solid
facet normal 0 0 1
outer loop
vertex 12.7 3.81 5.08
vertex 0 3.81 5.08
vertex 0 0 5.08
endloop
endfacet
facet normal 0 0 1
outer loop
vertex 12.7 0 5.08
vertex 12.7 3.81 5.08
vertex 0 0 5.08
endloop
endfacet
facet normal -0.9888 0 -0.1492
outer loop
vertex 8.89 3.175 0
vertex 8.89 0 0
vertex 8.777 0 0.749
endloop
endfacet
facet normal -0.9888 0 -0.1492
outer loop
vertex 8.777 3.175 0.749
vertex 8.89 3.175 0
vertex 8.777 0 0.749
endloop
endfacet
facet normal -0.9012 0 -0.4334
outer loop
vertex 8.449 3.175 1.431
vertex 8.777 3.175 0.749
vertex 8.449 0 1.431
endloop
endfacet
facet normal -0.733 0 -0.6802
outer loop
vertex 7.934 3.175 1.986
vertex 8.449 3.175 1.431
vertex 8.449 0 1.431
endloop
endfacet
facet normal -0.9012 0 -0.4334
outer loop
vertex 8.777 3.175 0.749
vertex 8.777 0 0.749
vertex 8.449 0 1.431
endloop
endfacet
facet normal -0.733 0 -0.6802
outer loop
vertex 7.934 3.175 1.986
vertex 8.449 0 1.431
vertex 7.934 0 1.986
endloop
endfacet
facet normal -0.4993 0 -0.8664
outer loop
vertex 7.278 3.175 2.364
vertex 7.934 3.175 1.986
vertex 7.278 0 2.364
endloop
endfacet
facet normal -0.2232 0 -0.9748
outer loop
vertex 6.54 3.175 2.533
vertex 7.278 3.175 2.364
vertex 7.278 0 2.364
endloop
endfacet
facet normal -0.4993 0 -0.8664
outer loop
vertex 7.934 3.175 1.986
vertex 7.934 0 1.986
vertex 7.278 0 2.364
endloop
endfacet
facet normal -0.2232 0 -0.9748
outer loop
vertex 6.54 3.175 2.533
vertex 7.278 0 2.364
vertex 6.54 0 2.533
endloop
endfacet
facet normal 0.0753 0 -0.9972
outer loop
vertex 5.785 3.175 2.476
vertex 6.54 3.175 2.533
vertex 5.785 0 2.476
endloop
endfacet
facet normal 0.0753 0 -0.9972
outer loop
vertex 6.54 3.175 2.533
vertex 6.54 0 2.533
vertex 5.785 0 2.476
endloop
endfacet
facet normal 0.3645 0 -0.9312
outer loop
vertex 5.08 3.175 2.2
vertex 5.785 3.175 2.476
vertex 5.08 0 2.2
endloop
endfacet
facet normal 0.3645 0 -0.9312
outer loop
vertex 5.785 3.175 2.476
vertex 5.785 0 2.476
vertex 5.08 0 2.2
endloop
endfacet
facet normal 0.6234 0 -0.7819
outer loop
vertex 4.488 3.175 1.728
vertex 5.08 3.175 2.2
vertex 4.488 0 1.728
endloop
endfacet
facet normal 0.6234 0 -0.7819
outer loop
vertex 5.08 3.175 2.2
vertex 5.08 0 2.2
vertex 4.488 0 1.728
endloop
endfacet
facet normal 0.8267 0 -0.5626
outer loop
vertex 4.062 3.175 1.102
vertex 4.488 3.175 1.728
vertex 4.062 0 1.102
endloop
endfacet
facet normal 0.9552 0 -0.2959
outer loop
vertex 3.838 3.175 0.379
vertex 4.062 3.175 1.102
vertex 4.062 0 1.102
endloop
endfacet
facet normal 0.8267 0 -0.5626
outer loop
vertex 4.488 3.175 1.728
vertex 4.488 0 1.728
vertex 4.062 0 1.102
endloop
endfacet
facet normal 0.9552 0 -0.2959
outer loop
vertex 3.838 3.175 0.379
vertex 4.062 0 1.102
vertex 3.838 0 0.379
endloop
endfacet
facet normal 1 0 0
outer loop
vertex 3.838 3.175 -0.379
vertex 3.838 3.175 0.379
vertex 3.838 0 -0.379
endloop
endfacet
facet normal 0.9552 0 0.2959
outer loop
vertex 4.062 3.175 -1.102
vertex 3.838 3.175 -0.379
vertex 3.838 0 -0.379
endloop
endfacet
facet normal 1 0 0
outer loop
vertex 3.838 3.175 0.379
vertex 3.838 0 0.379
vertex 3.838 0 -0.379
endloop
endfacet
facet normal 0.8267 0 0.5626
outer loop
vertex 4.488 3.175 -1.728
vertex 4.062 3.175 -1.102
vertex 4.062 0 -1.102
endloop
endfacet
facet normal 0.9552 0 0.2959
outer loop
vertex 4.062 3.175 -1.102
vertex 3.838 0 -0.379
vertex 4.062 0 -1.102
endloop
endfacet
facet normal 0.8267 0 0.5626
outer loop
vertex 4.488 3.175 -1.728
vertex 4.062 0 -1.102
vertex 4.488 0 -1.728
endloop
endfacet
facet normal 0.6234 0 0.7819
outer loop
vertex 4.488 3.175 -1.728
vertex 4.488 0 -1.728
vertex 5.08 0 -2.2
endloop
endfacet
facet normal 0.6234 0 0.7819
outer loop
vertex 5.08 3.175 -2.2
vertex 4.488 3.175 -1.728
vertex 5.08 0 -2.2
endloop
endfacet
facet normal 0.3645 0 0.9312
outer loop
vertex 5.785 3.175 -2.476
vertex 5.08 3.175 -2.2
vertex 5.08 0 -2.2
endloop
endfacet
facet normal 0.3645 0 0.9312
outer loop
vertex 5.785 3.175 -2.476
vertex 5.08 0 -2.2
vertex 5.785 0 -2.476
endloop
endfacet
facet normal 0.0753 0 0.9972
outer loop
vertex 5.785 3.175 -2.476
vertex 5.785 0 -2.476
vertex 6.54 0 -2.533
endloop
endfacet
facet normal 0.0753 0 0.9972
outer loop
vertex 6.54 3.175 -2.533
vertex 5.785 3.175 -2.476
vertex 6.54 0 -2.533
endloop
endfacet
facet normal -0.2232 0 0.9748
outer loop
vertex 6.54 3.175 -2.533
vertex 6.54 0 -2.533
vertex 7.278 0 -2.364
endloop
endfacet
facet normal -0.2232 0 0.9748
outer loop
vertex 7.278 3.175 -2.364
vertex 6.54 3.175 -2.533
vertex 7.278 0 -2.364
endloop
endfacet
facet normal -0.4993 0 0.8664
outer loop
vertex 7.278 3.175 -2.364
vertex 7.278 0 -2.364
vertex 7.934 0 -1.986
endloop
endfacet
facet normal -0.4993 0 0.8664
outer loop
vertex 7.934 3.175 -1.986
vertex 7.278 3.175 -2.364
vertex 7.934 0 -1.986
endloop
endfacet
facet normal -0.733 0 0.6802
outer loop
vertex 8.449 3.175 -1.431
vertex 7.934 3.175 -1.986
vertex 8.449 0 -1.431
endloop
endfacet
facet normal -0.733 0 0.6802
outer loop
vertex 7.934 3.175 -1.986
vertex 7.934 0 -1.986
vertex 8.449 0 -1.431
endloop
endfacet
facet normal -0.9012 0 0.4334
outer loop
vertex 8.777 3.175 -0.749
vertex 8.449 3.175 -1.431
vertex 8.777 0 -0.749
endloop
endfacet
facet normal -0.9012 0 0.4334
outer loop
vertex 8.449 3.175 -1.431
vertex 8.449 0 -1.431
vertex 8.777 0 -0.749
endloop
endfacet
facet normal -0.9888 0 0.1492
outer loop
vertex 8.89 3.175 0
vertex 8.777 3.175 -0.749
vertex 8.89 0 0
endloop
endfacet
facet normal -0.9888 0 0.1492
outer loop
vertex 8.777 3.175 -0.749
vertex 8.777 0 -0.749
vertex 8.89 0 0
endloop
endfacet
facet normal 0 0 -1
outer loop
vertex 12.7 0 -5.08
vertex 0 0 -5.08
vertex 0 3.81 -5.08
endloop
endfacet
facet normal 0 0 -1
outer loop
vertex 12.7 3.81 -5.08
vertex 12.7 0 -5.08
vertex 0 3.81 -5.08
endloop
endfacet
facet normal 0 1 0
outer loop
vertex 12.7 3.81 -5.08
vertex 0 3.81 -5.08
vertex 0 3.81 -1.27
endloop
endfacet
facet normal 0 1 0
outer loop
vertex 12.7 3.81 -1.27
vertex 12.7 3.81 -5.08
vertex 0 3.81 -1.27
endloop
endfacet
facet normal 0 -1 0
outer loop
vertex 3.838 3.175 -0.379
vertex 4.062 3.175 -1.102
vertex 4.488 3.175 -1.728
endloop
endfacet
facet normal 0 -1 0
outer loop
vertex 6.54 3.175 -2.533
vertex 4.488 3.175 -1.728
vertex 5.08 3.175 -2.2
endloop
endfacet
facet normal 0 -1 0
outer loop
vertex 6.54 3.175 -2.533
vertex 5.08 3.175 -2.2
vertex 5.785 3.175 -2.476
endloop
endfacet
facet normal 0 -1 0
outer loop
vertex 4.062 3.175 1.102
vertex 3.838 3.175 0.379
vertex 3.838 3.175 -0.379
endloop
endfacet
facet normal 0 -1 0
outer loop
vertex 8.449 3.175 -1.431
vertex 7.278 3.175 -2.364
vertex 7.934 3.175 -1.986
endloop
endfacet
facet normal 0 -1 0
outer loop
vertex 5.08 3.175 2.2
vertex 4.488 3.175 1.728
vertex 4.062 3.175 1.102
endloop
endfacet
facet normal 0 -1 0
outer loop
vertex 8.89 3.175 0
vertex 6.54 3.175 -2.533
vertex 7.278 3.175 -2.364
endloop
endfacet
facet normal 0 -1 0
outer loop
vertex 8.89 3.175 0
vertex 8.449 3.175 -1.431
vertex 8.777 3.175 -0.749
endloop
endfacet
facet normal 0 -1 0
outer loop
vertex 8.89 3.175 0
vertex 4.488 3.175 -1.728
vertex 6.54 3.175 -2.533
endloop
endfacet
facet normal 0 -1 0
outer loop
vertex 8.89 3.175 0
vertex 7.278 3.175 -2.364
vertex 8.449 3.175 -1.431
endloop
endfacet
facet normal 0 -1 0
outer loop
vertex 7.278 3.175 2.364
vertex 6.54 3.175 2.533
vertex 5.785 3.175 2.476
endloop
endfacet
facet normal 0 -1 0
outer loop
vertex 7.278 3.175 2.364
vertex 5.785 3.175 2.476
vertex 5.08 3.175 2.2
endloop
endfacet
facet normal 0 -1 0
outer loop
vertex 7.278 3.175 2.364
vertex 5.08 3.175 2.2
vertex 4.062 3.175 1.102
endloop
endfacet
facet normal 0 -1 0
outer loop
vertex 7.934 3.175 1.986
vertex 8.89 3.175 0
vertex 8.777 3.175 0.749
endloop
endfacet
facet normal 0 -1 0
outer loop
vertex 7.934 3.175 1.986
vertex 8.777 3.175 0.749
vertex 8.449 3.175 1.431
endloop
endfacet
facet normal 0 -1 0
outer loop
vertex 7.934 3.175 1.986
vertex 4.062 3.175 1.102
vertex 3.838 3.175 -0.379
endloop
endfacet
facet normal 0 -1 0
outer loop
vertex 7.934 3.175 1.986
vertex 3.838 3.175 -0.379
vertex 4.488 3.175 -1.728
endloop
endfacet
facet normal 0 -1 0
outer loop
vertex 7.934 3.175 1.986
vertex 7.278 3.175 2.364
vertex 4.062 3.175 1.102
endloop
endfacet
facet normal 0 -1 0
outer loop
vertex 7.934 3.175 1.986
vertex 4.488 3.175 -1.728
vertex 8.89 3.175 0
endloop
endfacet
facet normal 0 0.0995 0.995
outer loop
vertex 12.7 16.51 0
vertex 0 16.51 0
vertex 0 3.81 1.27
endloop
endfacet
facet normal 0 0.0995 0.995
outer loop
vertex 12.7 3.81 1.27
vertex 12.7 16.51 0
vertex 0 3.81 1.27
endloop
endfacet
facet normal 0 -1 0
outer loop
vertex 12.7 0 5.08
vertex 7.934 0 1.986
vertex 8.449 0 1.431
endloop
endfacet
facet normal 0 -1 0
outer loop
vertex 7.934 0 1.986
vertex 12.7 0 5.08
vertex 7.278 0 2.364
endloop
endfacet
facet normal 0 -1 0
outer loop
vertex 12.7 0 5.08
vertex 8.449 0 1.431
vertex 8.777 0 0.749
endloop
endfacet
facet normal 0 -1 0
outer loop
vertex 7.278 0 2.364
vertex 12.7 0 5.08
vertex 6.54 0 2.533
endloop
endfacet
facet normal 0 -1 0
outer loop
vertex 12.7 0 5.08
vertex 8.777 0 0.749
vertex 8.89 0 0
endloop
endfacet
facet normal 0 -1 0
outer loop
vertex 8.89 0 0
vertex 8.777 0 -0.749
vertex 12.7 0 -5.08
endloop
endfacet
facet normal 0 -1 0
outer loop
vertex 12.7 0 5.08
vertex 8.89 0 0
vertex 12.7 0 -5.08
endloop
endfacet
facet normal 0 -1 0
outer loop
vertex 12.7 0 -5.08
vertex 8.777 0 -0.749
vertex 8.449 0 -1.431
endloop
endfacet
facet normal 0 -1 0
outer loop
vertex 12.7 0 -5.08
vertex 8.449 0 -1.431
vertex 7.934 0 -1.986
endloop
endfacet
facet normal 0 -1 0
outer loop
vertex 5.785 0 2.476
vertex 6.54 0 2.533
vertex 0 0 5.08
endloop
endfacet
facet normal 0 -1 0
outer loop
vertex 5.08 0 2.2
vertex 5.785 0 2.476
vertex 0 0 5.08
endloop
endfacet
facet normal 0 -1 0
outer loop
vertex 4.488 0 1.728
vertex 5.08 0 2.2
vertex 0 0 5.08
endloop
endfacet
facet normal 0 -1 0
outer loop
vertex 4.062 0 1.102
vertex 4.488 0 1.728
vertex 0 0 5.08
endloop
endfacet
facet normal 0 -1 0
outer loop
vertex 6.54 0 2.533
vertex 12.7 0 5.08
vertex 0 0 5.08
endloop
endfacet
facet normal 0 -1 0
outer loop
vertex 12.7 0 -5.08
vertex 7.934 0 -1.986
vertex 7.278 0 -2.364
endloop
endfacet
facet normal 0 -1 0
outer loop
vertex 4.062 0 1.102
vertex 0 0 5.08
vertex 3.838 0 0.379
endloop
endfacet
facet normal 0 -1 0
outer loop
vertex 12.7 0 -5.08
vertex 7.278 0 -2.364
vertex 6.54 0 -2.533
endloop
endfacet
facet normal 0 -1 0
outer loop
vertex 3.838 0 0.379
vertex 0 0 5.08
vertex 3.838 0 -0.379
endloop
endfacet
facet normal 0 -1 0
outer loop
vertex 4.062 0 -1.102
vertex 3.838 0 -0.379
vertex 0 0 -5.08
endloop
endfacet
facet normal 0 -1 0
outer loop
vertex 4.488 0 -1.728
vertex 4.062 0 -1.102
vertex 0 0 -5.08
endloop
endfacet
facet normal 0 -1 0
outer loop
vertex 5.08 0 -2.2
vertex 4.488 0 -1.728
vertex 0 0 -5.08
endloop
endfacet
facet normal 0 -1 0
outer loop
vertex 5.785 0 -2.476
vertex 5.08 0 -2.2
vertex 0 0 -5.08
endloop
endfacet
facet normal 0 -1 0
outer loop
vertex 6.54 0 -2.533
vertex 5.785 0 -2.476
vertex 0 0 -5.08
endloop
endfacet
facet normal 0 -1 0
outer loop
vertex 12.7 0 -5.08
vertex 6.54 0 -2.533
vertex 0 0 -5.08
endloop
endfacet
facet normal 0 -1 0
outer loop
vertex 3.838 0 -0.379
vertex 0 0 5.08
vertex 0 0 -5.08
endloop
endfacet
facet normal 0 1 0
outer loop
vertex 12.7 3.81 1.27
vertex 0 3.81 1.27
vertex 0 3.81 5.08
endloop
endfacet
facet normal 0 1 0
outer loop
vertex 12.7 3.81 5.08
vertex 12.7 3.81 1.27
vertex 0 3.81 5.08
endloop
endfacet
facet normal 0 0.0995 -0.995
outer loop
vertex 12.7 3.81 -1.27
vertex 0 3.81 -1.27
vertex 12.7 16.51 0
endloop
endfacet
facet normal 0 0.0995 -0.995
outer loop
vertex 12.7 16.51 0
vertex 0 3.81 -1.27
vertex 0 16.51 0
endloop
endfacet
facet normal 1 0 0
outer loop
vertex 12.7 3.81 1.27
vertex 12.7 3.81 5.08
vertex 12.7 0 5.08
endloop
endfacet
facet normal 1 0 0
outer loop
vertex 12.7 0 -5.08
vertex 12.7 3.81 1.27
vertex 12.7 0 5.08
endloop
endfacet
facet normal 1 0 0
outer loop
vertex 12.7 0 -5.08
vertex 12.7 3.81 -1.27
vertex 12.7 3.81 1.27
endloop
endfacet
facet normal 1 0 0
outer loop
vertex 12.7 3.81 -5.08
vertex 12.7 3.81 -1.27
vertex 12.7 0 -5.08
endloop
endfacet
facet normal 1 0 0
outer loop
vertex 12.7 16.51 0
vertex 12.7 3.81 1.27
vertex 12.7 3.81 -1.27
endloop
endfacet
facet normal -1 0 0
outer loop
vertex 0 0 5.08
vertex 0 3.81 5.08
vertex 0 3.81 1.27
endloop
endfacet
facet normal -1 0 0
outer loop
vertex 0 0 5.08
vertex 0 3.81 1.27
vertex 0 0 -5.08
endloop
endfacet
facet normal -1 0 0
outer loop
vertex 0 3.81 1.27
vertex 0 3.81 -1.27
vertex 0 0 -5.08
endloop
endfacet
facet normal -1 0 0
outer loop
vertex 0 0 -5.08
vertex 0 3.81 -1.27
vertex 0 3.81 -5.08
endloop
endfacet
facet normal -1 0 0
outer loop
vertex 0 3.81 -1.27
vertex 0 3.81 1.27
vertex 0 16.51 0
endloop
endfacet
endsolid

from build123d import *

# Parameters (mm, degrees)
BOSS_EXTRUDE1_DEPTH = 12.7
SKETCH2_R           = 2.54
CUT_EXTRUDE1_DEPTH  = 3.175


with BuildPart() as part:
    # Sketch1 → Boss-Extrude1 (new body)
    with BuildSketch(Plane(origin=(0, 0, 0), x_dir=(0, 0, -1), z_dir=(1, 0, 0))):
        Polygon((1.27, 3.81), (0, 16.51), (-1.27, 3.81), (-5.08, 3.81), (-5.08, 0), (5.08, 0), (5.08, 3.81), align=None)
    extrude(amount=BOSS_EXTRUDE1_DEPTH)

    # Sketch2 → Cut-Extrude1 (cut)
    with BuildSketch(Plane.XZ):
        with Locations((6.35, 0)):
            Circle(SKETCH2_R)
    extrude(amount=-CUT_EXTRUDE1_DEPTH, mode=Mode.SUBTRACT)


solid = part.part
